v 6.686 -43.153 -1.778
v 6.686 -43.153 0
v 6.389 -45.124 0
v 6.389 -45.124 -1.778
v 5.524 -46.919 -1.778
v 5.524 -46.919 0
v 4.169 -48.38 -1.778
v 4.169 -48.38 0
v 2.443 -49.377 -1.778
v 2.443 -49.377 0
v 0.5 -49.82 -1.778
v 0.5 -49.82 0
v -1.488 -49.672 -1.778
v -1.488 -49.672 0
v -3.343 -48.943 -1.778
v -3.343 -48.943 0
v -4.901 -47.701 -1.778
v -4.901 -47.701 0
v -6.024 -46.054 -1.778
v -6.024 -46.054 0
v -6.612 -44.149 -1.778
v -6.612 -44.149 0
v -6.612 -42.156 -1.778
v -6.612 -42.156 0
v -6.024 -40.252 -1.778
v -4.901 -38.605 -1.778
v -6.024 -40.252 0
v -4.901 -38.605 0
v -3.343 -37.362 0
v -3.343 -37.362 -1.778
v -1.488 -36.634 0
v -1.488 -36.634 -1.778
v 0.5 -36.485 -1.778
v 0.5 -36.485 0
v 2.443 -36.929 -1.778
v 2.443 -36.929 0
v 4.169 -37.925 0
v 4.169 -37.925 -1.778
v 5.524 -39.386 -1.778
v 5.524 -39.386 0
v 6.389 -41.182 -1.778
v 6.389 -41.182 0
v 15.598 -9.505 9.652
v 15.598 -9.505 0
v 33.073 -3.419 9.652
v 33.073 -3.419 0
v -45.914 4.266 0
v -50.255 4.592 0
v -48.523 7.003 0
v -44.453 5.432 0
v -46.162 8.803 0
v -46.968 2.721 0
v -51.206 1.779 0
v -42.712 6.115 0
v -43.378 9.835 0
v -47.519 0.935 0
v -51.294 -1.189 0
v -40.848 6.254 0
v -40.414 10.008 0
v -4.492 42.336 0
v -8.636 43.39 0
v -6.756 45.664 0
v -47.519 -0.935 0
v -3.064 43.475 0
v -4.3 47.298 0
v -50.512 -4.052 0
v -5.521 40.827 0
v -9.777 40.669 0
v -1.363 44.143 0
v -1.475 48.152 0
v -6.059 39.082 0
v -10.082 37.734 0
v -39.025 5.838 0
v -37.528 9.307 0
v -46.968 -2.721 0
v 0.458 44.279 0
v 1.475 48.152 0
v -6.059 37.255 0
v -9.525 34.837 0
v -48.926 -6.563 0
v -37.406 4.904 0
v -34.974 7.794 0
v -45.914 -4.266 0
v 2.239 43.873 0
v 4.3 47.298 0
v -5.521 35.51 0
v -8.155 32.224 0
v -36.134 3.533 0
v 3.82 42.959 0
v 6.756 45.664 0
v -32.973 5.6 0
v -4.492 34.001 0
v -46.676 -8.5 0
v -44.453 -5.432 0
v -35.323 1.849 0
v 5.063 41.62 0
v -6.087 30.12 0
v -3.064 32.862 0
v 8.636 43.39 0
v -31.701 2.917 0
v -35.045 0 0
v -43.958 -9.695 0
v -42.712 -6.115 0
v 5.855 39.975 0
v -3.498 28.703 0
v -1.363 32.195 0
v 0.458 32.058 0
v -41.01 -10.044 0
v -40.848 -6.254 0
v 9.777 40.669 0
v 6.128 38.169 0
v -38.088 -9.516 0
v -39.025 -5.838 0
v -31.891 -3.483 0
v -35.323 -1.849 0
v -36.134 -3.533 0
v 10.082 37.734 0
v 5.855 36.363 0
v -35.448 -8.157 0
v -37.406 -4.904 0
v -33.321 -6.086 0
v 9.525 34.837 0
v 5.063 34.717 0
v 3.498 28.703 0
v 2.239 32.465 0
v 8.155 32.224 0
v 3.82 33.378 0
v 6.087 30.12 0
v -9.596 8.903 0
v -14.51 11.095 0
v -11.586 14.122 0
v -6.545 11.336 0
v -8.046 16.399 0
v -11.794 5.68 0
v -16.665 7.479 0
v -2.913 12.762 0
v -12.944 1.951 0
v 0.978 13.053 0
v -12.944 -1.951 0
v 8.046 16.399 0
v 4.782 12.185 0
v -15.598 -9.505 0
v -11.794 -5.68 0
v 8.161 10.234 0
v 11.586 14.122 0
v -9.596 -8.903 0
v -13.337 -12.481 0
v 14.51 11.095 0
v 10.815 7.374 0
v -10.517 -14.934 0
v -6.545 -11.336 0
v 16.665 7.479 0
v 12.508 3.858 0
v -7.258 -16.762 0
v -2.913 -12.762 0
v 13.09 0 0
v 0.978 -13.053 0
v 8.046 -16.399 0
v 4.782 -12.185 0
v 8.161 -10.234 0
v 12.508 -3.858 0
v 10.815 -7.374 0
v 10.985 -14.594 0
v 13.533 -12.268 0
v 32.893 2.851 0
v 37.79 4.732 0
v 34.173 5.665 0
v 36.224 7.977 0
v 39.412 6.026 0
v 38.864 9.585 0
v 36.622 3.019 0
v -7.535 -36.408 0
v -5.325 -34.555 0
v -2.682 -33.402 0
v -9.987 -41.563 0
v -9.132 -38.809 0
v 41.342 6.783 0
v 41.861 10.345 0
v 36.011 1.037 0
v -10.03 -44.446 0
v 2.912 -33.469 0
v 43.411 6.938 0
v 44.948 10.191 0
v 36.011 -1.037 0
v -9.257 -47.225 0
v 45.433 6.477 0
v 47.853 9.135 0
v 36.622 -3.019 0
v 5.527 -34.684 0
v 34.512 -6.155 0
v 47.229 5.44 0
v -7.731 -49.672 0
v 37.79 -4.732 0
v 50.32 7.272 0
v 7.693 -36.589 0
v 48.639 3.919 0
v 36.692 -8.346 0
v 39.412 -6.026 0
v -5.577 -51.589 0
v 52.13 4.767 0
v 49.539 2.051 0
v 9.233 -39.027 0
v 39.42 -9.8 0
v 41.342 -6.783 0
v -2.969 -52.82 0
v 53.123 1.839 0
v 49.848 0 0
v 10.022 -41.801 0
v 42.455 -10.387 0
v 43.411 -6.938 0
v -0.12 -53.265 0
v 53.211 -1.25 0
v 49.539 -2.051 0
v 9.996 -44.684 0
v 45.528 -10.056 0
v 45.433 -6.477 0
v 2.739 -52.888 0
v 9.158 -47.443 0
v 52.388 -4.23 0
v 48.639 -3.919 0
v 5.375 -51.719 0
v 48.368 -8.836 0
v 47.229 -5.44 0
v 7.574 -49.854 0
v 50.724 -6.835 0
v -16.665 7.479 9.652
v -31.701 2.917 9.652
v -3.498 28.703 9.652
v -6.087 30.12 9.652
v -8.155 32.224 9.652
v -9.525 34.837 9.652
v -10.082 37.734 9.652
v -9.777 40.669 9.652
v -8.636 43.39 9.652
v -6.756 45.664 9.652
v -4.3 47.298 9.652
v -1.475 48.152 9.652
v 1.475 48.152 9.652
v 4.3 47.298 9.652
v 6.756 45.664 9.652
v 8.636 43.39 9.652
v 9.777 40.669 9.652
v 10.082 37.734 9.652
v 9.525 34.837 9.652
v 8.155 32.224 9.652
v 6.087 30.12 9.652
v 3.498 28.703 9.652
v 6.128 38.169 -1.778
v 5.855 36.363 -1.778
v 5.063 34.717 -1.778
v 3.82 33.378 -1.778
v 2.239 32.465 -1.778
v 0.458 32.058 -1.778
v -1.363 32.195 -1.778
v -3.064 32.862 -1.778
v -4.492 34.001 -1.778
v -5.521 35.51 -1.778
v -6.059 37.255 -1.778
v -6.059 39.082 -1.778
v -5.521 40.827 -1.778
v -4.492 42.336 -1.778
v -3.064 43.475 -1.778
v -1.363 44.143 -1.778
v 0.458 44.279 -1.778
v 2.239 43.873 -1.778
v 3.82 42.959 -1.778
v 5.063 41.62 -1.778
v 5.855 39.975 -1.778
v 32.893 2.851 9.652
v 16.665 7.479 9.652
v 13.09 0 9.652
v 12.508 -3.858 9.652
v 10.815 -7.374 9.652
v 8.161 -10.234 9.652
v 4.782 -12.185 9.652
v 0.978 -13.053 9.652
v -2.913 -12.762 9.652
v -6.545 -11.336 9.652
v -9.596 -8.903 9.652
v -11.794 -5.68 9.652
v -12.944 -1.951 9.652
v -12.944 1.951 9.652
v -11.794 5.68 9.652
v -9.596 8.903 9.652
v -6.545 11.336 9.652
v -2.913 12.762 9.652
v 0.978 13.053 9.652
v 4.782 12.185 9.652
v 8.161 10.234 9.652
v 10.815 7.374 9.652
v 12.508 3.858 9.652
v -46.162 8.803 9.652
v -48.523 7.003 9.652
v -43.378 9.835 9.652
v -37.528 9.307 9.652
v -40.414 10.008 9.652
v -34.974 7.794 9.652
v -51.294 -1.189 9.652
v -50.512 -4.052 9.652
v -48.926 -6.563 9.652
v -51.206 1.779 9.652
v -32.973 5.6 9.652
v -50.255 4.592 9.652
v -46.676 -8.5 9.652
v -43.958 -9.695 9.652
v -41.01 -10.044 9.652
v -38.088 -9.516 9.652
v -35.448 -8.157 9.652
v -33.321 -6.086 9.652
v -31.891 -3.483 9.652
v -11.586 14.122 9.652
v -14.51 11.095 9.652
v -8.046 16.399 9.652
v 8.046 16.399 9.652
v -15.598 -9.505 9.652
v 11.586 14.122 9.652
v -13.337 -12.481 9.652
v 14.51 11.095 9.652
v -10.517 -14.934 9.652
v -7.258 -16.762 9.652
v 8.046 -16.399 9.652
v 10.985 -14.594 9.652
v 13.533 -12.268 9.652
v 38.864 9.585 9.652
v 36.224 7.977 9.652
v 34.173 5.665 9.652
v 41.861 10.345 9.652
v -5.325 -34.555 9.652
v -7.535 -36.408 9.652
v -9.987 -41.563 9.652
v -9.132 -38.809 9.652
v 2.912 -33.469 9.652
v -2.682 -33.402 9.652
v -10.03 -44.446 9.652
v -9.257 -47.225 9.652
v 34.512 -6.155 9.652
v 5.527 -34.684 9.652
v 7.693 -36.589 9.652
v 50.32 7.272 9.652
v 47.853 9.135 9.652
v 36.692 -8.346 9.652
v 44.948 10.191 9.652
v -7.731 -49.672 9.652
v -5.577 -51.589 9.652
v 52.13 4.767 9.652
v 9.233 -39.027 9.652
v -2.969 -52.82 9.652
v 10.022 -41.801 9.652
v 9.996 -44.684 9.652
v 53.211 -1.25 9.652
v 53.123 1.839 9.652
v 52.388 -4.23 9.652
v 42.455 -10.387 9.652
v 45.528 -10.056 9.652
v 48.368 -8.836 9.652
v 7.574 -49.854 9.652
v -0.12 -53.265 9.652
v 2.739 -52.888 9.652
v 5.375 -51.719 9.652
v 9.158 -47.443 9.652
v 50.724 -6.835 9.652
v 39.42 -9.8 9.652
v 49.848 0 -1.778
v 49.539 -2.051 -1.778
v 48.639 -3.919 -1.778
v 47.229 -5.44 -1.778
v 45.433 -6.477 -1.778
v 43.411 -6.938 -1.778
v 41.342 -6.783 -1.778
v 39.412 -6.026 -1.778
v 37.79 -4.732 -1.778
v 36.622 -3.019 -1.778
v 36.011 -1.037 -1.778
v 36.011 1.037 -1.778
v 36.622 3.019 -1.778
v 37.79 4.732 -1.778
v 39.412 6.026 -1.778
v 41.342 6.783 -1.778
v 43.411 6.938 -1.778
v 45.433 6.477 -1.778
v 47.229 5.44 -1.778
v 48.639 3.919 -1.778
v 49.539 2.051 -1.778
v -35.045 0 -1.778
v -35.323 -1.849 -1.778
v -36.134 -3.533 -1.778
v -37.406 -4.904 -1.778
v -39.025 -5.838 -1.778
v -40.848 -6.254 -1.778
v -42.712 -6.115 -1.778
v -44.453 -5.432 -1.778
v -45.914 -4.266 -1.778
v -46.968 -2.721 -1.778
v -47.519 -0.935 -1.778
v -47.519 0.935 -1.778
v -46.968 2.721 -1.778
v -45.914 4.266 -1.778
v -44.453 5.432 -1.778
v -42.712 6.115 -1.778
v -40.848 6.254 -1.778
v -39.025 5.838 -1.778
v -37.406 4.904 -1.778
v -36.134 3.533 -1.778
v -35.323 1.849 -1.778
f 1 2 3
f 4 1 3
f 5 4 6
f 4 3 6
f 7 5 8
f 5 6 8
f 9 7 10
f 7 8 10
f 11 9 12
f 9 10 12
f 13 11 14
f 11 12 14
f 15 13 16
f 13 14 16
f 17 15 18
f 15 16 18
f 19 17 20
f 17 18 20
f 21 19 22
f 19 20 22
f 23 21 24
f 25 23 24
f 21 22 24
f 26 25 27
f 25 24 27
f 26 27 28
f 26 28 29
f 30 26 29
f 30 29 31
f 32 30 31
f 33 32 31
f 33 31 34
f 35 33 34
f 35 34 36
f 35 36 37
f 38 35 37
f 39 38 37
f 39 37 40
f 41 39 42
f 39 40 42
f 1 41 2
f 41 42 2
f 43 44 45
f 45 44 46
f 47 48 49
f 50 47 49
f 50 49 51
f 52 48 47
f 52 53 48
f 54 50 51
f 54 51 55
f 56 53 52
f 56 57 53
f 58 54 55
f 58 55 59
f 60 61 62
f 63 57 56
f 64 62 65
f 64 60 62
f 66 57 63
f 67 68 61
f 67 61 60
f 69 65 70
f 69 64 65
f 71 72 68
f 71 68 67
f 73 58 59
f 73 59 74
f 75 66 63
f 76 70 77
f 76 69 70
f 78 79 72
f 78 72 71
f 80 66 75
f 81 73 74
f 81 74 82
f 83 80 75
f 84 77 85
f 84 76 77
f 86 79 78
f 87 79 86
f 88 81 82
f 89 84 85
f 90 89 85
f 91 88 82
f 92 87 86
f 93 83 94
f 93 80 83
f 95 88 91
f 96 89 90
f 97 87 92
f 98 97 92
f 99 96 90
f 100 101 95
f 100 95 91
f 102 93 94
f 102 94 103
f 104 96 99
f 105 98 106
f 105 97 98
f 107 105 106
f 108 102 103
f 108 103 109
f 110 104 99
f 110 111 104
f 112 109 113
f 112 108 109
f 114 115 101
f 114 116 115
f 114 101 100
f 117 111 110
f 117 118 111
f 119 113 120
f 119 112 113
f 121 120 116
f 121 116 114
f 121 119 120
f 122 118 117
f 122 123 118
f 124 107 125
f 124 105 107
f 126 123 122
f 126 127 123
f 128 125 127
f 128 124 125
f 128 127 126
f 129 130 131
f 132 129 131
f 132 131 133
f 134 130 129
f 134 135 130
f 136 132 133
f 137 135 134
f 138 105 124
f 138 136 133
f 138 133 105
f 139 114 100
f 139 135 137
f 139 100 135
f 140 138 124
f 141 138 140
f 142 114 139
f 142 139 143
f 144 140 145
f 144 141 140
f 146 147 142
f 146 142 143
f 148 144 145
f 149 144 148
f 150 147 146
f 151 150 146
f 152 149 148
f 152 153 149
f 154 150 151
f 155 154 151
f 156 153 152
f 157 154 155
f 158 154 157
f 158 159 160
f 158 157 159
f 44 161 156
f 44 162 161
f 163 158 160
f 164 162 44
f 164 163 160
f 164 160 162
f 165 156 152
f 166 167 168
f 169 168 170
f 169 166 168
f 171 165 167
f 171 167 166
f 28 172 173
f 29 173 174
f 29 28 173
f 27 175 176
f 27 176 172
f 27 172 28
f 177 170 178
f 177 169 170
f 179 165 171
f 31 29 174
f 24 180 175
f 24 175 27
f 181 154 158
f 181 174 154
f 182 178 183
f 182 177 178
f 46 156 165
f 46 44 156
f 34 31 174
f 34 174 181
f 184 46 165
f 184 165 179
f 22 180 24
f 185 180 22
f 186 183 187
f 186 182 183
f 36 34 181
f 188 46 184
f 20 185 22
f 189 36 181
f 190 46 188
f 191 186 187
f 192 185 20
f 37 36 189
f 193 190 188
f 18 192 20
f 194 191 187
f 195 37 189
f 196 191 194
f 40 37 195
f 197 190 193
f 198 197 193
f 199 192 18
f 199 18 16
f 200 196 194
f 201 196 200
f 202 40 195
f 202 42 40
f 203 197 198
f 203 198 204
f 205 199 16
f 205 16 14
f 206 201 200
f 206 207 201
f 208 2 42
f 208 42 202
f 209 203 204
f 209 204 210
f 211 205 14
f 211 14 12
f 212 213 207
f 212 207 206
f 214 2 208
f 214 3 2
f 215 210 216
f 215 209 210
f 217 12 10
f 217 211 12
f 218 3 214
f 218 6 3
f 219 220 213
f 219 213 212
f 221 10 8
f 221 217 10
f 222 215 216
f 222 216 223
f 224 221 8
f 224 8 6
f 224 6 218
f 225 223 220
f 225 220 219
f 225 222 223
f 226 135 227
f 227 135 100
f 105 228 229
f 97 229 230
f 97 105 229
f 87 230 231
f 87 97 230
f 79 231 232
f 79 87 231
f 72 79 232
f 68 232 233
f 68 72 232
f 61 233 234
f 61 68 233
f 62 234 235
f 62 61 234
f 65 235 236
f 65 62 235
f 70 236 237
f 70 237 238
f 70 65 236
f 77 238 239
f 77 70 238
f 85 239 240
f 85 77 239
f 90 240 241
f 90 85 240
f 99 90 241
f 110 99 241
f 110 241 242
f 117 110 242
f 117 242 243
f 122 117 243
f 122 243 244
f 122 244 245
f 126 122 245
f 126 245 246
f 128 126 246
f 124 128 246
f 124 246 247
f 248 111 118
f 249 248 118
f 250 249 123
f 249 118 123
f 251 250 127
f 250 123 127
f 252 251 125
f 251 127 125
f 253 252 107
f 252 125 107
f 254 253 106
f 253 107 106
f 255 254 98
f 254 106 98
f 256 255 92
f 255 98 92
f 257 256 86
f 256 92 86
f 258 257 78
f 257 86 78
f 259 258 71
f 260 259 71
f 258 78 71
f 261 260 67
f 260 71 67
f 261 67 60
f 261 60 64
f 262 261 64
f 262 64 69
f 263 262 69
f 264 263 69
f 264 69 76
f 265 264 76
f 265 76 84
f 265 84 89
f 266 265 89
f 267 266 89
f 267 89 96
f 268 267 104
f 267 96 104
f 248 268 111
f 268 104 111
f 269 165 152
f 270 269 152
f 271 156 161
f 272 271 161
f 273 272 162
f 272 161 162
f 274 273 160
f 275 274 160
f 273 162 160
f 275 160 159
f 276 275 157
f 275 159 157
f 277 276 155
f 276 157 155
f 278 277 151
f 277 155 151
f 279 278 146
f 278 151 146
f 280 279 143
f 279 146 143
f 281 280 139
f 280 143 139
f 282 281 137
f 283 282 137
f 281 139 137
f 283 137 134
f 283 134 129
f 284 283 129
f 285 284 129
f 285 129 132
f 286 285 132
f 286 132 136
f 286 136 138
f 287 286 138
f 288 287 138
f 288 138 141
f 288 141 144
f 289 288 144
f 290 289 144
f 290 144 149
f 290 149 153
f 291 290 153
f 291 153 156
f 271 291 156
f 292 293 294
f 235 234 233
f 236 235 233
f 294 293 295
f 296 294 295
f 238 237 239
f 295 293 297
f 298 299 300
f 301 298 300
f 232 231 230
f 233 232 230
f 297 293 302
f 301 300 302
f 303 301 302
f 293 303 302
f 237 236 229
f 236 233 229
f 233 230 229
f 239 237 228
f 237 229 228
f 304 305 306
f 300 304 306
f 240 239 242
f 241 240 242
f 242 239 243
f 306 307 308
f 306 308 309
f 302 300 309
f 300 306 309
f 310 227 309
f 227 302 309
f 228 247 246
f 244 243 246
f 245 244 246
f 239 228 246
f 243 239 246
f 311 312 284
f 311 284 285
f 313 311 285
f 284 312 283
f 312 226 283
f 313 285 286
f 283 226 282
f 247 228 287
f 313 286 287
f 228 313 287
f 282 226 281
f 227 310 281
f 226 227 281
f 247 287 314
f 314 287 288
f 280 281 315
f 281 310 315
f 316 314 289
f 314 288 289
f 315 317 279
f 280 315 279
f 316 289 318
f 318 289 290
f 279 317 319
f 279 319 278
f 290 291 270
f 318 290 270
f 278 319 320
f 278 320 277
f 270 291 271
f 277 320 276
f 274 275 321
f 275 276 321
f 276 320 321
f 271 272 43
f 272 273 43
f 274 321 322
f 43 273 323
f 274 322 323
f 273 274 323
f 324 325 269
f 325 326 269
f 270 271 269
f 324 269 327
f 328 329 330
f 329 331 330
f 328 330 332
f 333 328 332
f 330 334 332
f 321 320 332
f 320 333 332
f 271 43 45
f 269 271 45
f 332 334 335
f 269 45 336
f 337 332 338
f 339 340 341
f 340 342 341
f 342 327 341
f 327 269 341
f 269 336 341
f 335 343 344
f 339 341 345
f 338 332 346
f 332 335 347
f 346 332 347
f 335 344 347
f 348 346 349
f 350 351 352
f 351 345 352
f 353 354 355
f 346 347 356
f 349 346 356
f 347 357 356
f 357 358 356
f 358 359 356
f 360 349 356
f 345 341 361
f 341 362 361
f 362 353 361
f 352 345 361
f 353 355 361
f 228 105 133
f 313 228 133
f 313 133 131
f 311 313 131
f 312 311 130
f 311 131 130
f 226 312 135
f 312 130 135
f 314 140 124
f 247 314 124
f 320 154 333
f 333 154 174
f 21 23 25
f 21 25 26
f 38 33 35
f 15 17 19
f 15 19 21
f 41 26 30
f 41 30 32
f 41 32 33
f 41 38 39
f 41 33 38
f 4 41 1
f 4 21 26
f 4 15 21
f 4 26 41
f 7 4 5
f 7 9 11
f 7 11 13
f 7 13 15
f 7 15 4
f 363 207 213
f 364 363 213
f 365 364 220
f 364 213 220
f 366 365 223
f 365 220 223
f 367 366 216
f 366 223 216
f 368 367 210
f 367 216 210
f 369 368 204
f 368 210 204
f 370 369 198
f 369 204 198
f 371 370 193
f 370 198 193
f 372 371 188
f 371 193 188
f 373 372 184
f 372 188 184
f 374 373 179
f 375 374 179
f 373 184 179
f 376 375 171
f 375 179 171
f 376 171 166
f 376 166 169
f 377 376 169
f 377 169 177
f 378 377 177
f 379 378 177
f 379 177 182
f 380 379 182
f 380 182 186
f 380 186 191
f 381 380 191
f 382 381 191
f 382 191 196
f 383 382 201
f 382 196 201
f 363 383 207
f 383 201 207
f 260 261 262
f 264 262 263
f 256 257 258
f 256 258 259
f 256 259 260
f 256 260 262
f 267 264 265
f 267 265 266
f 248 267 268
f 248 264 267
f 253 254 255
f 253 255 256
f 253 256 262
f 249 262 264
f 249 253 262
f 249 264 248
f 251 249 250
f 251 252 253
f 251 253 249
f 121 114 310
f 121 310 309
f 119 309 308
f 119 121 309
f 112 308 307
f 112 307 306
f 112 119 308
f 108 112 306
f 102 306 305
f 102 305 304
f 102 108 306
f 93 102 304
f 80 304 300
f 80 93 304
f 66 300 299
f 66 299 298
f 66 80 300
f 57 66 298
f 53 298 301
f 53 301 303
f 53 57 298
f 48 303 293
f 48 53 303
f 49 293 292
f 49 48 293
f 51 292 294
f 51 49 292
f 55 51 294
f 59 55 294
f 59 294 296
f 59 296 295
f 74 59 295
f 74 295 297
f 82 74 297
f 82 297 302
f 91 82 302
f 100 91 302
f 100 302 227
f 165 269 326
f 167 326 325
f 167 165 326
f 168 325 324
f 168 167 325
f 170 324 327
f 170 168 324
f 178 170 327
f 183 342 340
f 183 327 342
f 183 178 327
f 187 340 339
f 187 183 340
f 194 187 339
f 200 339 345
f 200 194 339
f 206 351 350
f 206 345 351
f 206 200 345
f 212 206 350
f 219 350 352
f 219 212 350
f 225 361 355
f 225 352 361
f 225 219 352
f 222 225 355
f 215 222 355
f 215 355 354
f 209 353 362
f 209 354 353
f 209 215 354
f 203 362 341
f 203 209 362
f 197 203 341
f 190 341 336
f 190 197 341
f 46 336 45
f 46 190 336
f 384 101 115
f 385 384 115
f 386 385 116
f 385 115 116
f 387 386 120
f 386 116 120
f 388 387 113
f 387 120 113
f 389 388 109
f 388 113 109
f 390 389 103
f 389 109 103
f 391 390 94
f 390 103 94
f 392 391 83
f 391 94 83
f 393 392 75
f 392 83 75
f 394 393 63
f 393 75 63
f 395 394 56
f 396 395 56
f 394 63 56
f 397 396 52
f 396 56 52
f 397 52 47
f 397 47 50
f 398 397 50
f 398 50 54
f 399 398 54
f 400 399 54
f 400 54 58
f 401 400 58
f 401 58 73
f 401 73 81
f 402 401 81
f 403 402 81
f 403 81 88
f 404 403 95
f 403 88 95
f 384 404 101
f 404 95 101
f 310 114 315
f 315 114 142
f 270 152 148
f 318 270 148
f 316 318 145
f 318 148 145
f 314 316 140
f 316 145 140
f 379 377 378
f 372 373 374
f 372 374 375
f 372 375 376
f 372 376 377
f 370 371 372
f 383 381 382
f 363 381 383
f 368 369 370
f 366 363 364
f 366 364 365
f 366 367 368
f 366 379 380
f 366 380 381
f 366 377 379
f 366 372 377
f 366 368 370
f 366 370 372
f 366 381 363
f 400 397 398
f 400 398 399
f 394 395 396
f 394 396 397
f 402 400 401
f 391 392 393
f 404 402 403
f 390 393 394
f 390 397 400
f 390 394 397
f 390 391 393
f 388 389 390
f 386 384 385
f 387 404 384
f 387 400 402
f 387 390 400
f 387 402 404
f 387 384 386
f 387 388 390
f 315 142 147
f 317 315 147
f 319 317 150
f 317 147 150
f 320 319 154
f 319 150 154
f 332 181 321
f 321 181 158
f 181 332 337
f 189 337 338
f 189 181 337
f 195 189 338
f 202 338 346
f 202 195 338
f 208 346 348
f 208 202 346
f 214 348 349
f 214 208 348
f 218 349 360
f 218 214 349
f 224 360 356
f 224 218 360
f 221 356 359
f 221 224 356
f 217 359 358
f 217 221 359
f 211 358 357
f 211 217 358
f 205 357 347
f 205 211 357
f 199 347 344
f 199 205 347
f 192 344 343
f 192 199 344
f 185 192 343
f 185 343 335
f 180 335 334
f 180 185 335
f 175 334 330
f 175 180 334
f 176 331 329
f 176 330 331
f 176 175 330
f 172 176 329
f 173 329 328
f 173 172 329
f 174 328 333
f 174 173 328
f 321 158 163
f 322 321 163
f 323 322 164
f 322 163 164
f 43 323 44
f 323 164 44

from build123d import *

# Parameters (mm, degrees)
F1_DEPTH = 9.652
F2_R     = 13.09002
F3_DEPTH = 25.4
F5_DEPTH = 9.6012
F4_R     = 10.091384
F4_R_2   = 10.048358
F4_R_3   = 10.112855
F4_R_4   = 10.396181
F6_DEPTH = 9.652
F7_R     = 6.272016
F7_R_2   = 6.127507
F7_R_3   = 6.686235
F7_R_4   = 6.957728
F8_DEPTH = 1.778


with BuildPart() as f1:
    # F0 (on Top) → F1 (new body)
    with BuildSketch(Plane.XY):
        with BuildLine():
            ThreePointArc((-15.598199, -9.505272), (-18.230297, -1.14468), (-16.664672, 7.479486))
            Line((-16.664672, 7.479486), (-41.31664, 0))
            Line((-41.31664, 0), (-15.598199, -9.505272))
        make_face()
        with BuildLine():
            ThreePointArc((16.664672, 7.479486), (17.86133, 3.824513), (18.266199, 0))
            ThreePointArc((18.266199, 0), (17.586555, -4.936305), (15.598199, -9.505272))
            Line((15.598199, -9.505272), (42.890608, 0))
            Line((42.890608, 0), (16.664672, 7.479486))
        make_face()
        with BuildLine():
            Line((0, -43.152936), (8.045985, -16.398663))
            ThreePointArc((8.045985, -16.398663), (0.43413, -18.261039), (-7.257626, -16.762484))
            Line((-7.257626, -16.762484), (0, -43.152936))
        make_face()
        with BuildLine():
            ThreePointArc((15.598199, -9.505272), (17.586555, -4.936305), (18.266199, 0))
            ThreePointArc((18.266199, 0), (17.86133, 3.824513), (16.664672, 7.479486))
            ThreePointArc((16.664672, 7.479486), (13.135527, 12.692988), (8.045985, 16.398663))
            ThreePointArc((8.045985, 16.398663), (0, 18.266199), (-8.045985, 16.398663))
            ThreePointArc((-8.045985, 16.398663), (-13.135527, 12.692988), (-16.664672, 7.479486))
            ThreePointArc((-16.664672, 7.479486), (-18.230297, -1.14468), (-15.598199, -9.505272))
            ThreePointArc((-15.598199, -9.505272), (-11.990162, -13.78006), (-7.257626, -16.762484))
            ThreePointArc((-7.257626, -16.762484), (0.43413, -18.261039), (8.045985, -16.398663))
            ThreePointArc((8.045985, -16.398663), (12.314283, -13.491199), (15.598199, -9.505272))
        make_face()
        with BuildLine():
            ThreePointArc((-8.045985, 16.398663), (0, 18.266199), (8.045985, 16.398663))
            Line((8.045985, 16.398663), (0, 38.168706))
            Line((0, 38.168706), (-8.045985, 16.398663))
        make_face()
    extrude(amount=F1_DEPTH)

    # F2 (on face) → F3 (cut)
    with BuildSketch(Plane(origin=(0, 0, 0), x_dir=(1, 0, 0), z_dir=(0, 0, -1))):
        Circle(F2_R)
    extrude(amount=-F3_DEPTH, mode=Mode.SUBTRACT)

    # F4 (on face) → F5 (join)
    with BuildSketch(Plane(origin=(0, 0, 0), x_dir=(1, 0, 0), z_dir=(0, 0, -1))):
        with BuildLine():
            Line((0, -38.168706), (3.498384, -28.703119))
            ThreePointArc((3.498384, -28.703119), (0, -28.077322), (-3.498384, -28.703119))
            Line((-3.498384, -28.703119), (0, -38.168706))
        make_face()
    extrude(amount=-F5_DEPTH)

    # F4 (on face) → F6 (join)
    with BuildSketch(Plane(origin=(0, 0, 0), x_dir=(1, 0, 0), z_dir=(0, 0, -1))):
        with Locations((0, -38.168706)):
            Circle(F4_R)
        with Locations((-41.31664, 0)):
            Circle(F4_R_2)
        with Locations((0, 43.152936)):
            Circle(F4_R_3)
        with Locations((42.890608, 0)):
            Circle(F4_R_4)
    extrude(amount=-F6_DEPTH)

    # F7 (on face) → F8 (join)
    with BuildSketch(Plane(origin=(0, 0, 0), x_dir=(1, 0, 0), z_dir=(0, 0, -1))):
        with Locations((-41.31664, 0)):
            Circle(F7_R)
        with Locations((0, -38.168706)):
            Circle(F7_R_2)
        with Locations((0, 43.152936)):
            Circle(F7_R_3)
        with Locations((42.890608, 0)):
            Circle(F7_R_4)
    extrude(amount=F8_DEPTH)


solid = f1.part
